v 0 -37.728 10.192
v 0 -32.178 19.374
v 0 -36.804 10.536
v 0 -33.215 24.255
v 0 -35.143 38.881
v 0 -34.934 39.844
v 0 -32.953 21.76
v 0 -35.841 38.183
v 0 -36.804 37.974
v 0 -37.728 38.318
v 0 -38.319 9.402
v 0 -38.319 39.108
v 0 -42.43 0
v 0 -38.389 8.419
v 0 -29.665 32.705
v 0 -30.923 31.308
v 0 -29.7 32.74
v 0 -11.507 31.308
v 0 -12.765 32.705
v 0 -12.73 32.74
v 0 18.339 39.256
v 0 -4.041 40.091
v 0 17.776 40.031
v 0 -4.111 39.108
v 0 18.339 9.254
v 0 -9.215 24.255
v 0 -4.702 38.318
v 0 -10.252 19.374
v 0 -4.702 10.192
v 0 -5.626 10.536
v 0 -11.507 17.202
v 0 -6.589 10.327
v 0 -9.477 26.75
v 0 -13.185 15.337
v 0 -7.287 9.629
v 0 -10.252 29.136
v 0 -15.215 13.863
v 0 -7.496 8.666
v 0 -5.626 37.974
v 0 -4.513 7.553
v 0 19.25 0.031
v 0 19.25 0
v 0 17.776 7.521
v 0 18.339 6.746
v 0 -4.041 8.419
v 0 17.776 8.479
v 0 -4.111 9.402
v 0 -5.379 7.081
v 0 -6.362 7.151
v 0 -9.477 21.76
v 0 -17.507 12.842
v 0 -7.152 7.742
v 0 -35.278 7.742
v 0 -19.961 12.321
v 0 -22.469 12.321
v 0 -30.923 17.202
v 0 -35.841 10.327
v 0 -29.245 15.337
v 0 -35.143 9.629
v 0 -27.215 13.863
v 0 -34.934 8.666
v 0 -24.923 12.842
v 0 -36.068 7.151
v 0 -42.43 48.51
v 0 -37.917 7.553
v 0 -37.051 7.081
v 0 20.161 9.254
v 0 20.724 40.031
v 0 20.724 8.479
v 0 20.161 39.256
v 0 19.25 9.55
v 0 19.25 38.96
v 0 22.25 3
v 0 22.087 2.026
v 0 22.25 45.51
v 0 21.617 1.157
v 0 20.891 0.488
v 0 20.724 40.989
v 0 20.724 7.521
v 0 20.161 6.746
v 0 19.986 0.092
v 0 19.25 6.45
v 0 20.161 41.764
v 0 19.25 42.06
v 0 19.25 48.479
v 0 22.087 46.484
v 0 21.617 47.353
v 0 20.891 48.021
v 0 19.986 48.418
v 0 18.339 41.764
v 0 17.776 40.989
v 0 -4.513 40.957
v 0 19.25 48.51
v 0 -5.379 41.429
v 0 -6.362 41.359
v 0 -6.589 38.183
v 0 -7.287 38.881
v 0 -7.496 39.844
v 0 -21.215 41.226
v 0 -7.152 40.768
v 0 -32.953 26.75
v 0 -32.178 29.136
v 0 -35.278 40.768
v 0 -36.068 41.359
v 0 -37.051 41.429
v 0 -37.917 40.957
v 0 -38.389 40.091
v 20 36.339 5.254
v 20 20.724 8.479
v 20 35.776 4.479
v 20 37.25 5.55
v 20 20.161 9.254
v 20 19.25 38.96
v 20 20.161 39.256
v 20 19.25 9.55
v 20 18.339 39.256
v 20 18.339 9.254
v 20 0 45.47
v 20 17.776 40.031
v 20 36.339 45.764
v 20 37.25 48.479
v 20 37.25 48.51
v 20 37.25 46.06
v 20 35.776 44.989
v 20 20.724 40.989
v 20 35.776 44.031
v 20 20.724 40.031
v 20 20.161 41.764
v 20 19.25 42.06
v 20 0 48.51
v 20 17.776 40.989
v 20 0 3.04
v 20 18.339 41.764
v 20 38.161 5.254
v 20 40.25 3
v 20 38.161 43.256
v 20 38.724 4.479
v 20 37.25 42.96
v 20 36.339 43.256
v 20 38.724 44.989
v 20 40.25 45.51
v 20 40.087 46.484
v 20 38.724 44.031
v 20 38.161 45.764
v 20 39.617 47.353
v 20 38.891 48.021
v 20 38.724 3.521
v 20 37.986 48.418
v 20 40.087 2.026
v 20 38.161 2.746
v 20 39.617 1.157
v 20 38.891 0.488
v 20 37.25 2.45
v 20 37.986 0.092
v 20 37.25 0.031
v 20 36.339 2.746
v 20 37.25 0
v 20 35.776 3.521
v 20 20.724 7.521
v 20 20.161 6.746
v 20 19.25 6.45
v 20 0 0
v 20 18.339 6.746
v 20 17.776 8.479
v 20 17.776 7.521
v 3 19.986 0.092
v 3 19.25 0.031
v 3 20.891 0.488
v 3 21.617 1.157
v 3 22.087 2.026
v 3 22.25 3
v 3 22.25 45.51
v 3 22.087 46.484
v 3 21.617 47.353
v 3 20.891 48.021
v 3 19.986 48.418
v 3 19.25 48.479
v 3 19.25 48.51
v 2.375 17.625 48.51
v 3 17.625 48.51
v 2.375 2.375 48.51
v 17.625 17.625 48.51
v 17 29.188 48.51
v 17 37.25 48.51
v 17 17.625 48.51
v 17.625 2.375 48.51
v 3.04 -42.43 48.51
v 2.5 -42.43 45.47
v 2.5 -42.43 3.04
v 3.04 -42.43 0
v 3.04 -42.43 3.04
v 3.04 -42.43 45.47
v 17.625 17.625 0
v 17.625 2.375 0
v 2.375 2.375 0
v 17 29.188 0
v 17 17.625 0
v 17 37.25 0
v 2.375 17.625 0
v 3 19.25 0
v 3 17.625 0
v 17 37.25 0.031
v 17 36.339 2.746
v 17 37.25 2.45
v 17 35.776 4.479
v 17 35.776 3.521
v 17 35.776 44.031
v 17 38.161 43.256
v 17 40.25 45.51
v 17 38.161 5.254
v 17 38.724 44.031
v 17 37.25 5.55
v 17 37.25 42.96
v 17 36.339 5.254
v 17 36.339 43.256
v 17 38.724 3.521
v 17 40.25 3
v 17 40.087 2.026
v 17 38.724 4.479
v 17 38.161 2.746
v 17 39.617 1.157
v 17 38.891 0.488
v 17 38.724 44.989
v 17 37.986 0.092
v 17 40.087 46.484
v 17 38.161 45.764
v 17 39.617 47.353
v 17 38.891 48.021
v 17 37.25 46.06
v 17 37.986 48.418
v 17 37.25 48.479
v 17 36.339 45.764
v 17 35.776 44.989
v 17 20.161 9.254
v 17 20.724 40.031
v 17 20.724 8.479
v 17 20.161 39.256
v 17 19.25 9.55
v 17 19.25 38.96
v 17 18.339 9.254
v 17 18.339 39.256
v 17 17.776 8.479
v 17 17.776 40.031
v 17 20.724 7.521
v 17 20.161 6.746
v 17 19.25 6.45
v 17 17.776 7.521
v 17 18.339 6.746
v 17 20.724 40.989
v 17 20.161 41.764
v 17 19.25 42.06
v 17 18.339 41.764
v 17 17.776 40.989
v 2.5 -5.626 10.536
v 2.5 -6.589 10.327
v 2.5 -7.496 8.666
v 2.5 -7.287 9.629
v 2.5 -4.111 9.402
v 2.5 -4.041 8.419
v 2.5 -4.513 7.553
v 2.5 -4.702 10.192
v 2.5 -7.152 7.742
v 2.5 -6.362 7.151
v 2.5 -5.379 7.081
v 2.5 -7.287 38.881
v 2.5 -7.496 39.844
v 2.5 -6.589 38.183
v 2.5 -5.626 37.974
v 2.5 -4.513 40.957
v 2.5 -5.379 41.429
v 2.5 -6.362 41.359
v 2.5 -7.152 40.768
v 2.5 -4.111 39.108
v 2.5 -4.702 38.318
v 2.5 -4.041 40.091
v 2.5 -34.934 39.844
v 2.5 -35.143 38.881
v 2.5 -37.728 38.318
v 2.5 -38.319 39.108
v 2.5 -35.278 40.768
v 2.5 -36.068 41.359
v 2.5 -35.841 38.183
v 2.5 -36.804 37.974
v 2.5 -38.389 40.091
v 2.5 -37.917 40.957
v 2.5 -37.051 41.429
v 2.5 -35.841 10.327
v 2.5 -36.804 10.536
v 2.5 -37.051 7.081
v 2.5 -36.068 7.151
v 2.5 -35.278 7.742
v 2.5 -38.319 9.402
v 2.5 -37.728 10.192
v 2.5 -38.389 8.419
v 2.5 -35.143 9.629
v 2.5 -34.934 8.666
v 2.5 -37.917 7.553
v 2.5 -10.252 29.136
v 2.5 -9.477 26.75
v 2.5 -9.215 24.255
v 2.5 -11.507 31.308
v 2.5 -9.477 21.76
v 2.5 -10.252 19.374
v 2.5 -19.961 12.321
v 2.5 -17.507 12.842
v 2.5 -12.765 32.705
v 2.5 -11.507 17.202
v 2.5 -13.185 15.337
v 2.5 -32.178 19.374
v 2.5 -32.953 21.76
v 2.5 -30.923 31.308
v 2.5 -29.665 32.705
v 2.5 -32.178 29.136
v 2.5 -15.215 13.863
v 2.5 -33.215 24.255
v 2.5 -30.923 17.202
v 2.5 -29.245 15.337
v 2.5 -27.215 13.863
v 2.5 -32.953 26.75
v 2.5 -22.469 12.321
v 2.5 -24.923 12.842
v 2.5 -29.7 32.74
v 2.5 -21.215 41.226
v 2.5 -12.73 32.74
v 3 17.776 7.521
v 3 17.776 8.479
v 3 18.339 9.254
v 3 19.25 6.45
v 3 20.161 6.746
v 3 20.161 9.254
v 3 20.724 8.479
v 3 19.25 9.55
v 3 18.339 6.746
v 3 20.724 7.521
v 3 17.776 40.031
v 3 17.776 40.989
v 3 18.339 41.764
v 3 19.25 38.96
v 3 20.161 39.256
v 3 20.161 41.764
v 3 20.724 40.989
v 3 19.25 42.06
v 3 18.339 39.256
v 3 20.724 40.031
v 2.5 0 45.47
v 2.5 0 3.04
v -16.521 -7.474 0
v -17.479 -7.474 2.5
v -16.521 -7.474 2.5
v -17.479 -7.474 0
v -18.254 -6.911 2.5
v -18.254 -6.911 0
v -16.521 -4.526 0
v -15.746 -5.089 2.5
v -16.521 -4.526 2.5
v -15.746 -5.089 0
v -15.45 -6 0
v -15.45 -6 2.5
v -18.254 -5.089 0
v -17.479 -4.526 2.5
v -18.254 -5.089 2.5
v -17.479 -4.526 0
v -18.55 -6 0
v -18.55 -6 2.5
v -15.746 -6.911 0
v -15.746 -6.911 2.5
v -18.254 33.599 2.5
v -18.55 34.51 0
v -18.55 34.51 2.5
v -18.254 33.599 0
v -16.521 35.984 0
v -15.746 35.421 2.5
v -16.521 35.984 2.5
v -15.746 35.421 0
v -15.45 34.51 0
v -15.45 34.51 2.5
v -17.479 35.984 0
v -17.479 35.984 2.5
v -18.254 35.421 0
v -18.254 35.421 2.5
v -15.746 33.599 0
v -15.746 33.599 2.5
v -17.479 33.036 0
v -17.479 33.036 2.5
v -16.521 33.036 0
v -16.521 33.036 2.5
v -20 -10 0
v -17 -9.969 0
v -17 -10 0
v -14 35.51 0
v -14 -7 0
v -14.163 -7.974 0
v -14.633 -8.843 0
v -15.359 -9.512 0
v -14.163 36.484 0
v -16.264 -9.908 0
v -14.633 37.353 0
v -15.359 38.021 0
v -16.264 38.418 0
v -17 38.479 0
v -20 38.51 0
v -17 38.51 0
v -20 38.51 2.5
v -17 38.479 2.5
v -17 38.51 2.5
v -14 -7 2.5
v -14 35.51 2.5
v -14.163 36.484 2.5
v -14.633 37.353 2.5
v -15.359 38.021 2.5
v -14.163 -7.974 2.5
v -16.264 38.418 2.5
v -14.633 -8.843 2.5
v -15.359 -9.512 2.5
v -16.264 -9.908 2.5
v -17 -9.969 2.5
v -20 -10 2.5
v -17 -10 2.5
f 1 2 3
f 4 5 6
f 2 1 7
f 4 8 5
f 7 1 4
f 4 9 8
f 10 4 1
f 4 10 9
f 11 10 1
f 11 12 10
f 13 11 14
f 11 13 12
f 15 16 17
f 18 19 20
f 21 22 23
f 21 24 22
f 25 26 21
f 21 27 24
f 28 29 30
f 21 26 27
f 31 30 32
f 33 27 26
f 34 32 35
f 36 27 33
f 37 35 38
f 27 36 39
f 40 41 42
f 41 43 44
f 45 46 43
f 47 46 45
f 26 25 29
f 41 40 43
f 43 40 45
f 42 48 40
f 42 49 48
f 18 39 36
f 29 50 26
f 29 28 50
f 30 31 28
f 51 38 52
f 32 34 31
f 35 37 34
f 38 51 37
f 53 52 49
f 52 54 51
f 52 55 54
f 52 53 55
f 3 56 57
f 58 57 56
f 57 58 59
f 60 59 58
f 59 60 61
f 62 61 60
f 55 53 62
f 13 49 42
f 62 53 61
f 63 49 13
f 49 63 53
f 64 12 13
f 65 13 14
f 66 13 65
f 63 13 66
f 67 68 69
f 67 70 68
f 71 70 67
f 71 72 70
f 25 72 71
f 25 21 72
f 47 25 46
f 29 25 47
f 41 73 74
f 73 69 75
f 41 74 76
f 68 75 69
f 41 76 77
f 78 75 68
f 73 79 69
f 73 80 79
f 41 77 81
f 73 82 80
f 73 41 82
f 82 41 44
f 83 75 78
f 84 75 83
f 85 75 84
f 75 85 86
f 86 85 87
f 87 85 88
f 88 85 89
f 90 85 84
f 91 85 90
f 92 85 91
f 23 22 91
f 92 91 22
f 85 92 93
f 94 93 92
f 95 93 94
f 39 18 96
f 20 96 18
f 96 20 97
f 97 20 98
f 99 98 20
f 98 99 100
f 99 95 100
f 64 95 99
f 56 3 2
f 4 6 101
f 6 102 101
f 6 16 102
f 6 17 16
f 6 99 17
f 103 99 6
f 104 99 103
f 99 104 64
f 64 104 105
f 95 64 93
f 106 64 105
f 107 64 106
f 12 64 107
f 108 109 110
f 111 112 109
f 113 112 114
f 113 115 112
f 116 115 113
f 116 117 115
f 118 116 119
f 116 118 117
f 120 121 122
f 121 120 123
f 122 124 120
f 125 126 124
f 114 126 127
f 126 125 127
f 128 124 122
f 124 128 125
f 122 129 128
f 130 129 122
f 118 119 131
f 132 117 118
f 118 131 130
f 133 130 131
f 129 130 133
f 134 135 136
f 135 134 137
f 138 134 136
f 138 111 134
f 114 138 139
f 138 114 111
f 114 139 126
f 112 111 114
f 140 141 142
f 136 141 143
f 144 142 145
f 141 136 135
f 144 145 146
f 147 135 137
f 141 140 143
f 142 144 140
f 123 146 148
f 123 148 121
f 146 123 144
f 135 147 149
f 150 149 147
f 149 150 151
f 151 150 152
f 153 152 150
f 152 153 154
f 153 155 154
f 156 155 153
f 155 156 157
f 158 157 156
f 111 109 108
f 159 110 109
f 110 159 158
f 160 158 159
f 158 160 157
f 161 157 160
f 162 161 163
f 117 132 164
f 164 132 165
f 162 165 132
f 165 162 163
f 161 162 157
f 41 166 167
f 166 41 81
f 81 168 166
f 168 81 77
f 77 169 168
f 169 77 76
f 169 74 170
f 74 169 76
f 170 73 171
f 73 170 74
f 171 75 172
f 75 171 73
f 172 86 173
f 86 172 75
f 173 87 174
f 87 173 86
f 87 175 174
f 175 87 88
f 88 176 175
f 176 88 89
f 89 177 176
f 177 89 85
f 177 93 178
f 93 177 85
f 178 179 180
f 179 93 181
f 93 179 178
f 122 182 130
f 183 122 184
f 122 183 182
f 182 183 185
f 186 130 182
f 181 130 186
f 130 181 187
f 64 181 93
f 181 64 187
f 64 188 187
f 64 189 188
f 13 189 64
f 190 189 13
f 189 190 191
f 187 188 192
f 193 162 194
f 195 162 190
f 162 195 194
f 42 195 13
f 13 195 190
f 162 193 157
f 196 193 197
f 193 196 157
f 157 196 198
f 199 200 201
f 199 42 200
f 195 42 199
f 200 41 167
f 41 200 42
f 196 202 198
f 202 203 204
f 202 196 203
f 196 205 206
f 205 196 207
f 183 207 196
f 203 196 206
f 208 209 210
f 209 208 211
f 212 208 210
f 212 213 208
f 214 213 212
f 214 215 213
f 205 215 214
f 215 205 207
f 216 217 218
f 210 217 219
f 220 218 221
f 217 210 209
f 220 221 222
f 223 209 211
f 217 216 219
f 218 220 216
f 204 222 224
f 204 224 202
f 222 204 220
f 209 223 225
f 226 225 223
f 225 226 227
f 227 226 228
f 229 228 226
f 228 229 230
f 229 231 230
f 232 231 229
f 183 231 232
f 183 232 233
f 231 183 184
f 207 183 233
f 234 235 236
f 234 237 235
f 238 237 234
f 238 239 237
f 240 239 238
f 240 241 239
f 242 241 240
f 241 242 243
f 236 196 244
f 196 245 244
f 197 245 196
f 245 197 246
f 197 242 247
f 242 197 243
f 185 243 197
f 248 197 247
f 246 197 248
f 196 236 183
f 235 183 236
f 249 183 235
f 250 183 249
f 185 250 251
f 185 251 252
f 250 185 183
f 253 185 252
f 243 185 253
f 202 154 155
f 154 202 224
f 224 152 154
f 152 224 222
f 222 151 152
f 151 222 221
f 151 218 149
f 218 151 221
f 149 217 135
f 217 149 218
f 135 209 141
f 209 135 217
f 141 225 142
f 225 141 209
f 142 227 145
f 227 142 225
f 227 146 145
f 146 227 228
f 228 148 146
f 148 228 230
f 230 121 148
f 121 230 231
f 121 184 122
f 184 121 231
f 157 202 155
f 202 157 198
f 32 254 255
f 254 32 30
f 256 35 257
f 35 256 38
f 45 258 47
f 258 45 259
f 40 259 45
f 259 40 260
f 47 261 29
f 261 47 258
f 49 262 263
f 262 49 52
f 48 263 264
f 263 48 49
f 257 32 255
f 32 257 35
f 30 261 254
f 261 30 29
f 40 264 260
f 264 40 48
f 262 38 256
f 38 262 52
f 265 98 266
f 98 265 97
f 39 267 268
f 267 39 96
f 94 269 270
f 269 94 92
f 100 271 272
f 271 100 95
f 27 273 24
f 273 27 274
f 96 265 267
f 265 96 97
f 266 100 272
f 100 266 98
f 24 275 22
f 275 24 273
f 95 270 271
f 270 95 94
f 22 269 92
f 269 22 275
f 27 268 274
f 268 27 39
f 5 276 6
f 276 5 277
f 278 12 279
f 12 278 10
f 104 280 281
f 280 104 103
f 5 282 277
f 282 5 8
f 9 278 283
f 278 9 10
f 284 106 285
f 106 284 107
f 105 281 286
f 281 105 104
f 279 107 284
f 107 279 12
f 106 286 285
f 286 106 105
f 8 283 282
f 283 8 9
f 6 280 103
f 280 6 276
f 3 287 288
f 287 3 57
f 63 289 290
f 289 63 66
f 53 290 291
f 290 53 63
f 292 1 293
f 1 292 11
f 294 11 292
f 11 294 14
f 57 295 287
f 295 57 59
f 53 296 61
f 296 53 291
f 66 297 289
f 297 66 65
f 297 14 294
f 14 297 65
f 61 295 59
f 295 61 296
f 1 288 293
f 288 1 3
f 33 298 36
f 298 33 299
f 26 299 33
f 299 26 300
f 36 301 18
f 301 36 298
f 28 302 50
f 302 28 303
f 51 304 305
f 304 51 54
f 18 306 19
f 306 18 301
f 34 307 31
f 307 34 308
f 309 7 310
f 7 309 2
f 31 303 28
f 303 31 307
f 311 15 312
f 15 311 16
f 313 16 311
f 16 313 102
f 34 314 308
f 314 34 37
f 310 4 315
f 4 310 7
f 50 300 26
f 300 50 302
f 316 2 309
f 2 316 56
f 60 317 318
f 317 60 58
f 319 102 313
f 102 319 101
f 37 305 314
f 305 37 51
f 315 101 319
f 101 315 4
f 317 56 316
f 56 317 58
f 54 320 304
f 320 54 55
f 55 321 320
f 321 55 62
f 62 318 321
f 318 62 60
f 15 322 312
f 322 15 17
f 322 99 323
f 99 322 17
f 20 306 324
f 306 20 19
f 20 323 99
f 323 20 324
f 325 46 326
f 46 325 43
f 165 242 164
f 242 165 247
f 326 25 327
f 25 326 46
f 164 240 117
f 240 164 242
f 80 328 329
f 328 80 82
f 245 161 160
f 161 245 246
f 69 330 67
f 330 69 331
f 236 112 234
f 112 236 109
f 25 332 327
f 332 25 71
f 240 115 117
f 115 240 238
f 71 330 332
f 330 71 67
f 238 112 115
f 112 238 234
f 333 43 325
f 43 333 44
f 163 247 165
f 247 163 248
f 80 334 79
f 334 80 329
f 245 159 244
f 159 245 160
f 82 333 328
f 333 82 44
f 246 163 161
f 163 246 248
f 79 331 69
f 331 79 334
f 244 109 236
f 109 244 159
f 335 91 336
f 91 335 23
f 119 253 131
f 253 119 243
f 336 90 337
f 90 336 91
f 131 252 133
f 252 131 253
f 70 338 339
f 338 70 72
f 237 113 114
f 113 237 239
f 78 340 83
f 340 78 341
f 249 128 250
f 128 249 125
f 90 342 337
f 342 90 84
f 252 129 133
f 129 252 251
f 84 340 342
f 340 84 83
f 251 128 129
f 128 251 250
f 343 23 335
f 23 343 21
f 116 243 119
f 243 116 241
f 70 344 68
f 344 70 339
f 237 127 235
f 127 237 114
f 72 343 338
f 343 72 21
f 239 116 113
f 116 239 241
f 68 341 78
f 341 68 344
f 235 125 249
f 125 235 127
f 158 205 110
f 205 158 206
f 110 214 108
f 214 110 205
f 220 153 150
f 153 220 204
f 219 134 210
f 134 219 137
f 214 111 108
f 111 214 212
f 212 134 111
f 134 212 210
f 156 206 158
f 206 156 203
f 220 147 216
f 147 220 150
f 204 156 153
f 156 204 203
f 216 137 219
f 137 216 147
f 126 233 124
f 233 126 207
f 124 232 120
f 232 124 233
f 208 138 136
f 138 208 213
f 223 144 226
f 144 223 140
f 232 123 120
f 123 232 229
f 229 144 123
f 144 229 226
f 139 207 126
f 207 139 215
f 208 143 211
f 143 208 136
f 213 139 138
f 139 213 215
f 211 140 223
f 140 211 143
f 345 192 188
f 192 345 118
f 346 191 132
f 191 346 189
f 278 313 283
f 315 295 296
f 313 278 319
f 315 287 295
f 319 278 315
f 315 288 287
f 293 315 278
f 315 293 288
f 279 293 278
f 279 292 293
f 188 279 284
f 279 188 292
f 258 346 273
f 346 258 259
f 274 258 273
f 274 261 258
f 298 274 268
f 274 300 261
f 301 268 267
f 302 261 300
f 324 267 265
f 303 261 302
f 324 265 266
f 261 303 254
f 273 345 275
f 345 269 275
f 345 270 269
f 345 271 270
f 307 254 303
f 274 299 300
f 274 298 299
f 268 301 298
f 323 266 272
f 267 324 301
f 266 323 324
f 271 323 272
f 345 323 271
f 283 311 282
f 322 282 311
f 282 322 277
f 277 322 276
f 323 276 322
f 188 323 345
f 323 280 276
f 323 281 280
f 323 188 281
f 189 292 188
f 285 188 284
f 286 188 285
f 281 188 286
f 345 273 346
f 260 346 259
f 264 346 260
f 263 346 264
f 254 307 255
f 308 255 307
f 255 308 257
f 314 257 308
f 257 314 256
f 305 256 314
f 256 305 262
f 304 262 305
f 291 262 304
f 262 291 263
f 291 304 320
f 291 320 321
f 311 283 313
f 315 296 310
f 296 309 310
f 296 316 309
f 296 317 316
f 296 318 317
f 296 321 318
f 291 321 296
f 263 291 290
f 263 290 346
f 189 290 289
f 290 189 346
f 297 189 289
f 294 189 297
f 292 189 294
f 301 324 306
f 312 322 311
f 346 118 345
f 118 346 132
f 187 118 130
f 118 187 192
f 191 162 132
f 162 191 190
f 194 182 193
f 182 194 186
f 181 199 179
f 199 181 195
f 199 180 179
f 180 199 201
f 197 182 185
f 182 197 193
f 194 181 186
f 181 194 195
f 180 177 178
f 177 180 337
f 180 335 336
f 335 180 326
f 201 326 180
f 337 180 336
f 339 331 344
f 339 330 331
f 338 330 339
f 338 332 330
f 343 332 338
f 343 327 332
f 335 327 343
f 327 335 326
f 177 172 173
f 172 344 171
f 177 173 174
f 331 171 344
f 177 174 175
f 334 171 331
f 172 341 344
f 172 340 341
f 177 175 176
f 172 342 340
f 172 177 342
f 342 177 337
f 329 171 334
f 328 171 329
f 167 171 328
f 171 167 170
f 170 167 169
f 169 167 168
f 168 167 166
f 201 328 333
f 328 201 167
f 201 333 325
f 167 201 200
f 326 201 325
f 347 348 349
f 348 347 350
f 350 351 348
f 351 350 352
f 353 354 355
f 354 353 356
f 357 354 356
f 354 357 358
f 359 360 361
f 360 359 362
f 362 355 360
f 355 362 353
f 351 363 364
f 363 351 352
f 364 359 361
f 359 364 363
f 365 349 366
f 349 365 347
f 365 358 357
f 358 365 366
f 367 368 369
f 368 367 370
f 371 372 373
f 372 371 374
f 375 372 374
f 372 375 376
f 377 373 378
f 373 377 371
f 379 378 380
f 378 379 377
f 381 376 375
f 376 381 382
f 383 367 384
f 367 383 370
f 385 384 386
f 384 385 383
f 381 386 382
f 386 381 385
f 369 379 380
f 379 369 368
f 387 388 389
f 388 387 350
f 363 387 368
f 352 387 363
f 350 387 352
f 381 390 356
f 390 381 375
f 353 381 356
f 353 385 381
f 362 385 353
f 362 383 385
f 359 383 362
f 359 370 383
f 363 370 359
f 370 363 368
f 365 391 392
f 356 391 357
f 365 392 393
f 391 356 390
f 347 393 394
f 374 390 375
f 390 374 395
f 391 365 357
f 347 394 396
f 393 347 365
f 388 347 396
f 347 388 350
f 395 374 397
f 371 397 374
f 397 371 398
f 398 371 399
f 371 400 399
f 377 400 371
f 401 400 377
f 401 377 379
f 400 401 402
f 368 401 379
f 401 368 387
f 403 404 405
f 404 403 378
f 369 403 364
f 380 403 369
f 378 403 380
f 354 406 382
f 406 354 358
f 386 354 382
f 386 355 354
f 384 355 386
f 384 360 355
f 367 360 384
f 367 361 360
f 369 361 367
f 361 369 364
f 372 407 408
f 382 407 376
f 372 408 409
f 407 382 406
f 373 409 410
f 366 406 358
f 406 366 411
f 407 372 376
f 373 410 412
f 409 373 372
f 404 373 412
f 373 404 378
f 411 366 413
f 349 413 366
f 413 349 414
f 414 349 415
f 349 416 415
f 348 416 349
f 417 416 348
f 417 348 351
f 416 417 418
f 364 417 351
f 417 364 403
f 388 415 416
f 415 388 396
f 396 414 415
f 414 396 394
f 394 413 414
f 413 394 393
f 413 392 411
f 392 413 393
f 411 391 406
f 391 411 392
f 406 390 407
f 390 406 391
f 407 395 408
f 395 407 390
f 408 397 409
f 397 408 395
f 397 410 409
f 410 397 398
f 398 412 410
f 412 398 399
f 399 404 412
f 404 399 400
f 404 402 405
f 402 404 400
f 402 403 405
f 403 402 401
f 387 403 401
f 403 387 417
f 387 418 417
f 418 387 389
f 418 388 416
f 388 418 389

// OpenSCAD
// file: sweep.scad
// sweep.scad
//
// This code is copied from
// https://github.com/openscad/list-comprehension-demos
// and
// https://github.com/openscad/scad-utils
// to make hangprinter repo self-contained
// It was included in order to make the worm drive parametric
// In future OpenSCAD (or other script CAD programs)
// worm drives should be will be more easily constructed without
// this user space defined sweep operation.
// See OpenSCAD discussion at:
// https://github.com/openscad/openscad/issues/114

// Look into files
// lists.scad
// X transformations.scad
// linalg.scad
// se3.scad
// so3.scad


// Include modules and fcts:

/// linalg.scad
function vec3(p) = len(p) < 3 ? concat(p,0) : p;
function vec4(p) = let (v3=vec3(p)) len(v3) < 4 ? concat(v3,1) : v3;
function take3(v) = [v[0],v[1],v[2]];
function tail3(v) = [v[3],v[4],v[5]];
function construct_Rt(R,t) = [concat(R[0],t[0]),concat(R[1],t[1]),concat(R[2],t[2]),[0,0,0,1]];


/// so3.scad

function so3_exp_2(theta_sq) = [
	1.0 - theta_sq * (1.0 - theta_sq/20) / 6,
	0.5 - 0.25/6 * theta_sq
];


// Taylor series expansions close to 0
function so3_exp_1(theta_sq) = [
	1 - 1/6*theta_sq,
	0.5
];

function rodrigues_so3_exp(w, A, B) = [
  [1.0 - B*(w[1]*w[1] + w[2]*w[2]), B*(w[0]*w[1]) - A*w[2],          B*(w[0]*w[2]) + A*w[1]],
  [B*(w[0]*w[1]) + A*w[2],          1.0 - B*(w[0]*w[0] + w[2]*w[2]), B*(w[1]*w[2]) - A*w[0]],
  [B*(w[0]*w[2]) - A*w[1],          B*(w[1]*w[2]) + A*w[0],          1.0 - B*(w[0]*w[0] + w[1]*w[1])]
];

function so3_exp_3_0(theta_deg, inv_theta) = [
	sin(theta_deg) * inv_theta,
	(1 - cos(theta_deg)) * (inv_theta * inv_theta)
];

/// se3.scad
function se3_exp_2(t,w) = se3_exp_2_0(t,w,w*w);
function se3_exp_2_0(t,w,theta_sq) =
se3_exp_23(
	so3_exp_2(theta_sq),
	C = (1.0 - theta_sq/20) / 6,
	t=t,w=w);

function combine_se3_exp(w, ABt) = construct_Rt(rodrigues_so3_exp(w, ABt[0], ABt[1]), ABt[2]);
function se3_exp_1(t,w) = concat(
	so3_exp_1(w*w),
	[t + 0.5 * cross(w,t)]
);

function se3_exp_3(t,w) = se3_exp_3_0(t,w,sqrt(w*w)*180/PI,1/sqrt(w*w));

function se3_exp_23(AB,C,t,w) =
[AB[0], AB[1], t + AB[1] * cross(w,t) + C * cross(w,cross(w,t)) ];

function se3_exp_3_0(t,w,theta_deg,inv_theta) =
se3_exp_23(
	so3_exp_3_0(theta_deg = theta_deg, inv_theta = inv_theta),
	C = (1 - sin(theta_deg) * inv_theta) * (inv_theta * inv_theta),
t=t,w=w);

function se3_exp(mu) = se3_exp_0(t=take3(mu),w=tail3(mu)/180*PI);

function se3_exp_0(t,w) =
combine_se3_exp(w,
// Evaluate by Taylor expansion when near 0
	w*w < 1e-8
	? se3_exp_1(t,w)
	: w*w < 1e-6
	  ? se3_exp_2(t,w)
	  : se3_exp_3(t,w)
);


/// lists.scad
/*!
  Flattens a list one level:

  flatten([[0,1],[2,3]]) => [0,1,2,3]
*/
function flatten(list) = [ for (i = list, v = i) v ];
/*!
  Extracts a subarray from index begin (inclusive) to end (exclusive)

  subarray([1,2,3,4], 1, 2) => [2,3]
*/
function subarray(list,begin=0,end=-1) = [
    let(end = end < 0 ? len(list) : end)
      for (i = [begin : 1 : end-1])
        list[i]
];

/// transformations.scad
//********* Create modifying matrices ***************//
/*!
  Creates a rotation matrix

  xyz = euler angles = rz * ry * rx
  axis = rotation_axis * rotation_angle
*/
function rotation(xyz=undef, axis=undef) =
	xyz != undef && axis != undef ? undef :
	xyz == undef  ? se3_exp([0,0,0,axis[0],axis[1],axis[2]]) :
	len(xyz) == undef ? rotation(axis=[0,0,xyz]) :
	(len(xyz) >= 3 ? rotation(axis=[0,0,xyz[2]]) : identity4()) *
	(len(xyz) >= 2 ? rotation(axis=[0,xyz[1],0]) : identity4()) *
(len(xyz) >= 1 ? rotation(axis=[xyz[0],0,0]) : identity4());

/*!
  Creates a scaling matrix
*/
function scaling(v) = [
	[v[0],0,0,0],
	[0,v[1],0,0],
	[0,0,v[2],0],
	[0,0,0,1],
];

/*!
  Creates a translation matrix
*/
function translation(v) = [
	[1,0,0,v[0]],
	[0,1,0,v[1]],
	[0,0,1,v[2]],
	[0,0,0,1],
];


function project(x) = subarray(x,end=len(x)-1) / x[len(x)-1];

function transform(m, list) = [for (p=list) project(m * vec4(p))];

function to_3d(list) = [ for(v = list) vec3(v) ];

module sweep(shape, path_transforms, closed=false) {

    pathlen = len(path_transforms);
    segments = pathlen + (closed ? 0 : -1);
    shape3d = to_3d(shape);

    function sweep_points() =
      flatten([for (i=[0:pathlen-1])
        transform(path_transforms[i], shape3d)]);

    function loop_faces() = [let (facets=len(shape3d))
        for(s=[0:segments-1], i=[0:facets-1])
          [(s%pathlen) * facets + i,
           (s%pathlen) * facets + (i + 1) % facets,
           ((s + 1) % pathlen) * facets + (i + 1) % facets,
           ((s + 1) % pathlen) * facets + i]];

    bottom_cap = closed ? [] : [[for (i=[len(shape3d)-1:-1:0]) i]];
    top_cap = closed ? [] : [
      [for (i=[0:len(shape3d)-1])
        i+len(shape3d)*(pathlen-1)]];
    polyhedron(points = sweep_points(),
               faces  = concat(loop_faces(),
                               bottom_cap,
                               top_cap),
               convexity=5);
}
// file: parameters.scad
// Parameters shared between modules

Beam_width = 15;
Wiggle = 0.25;
Fat_beam_width = Beam_width + Wiggle;
Beam_length = 400;
Wall_th = 2.5;
Nema17_cube_width          = 42.43;
Nema17_screw_hole_width    = 43.74; // Opposite corner screws
Nema17_ring_diameter       = 22;
Nema17_cube_height         = 39.36;
Nema17_shaft_height        = 63.65;
Nema17_ring_height         = 2;
Nema17_screw_hole_width    = 43.74; // Opposite corner screws
Nema17_shaft_radius        = 5/2;
Nema23_cube_width          = 56;
Nema23_screw_hole_width    = 66.61;
Nema23_screw_holes          = 66.61;
Nema23_ring_diameter       = 38;
Nema23_cube_height         = 56;
Nema23_shaft_height        = 21;
Nema23_ring_height         = 2;
Nema23_shaft_radius        = 6.35/2;

b608_outer_dia = 22.2;
b608_width = 7.05;

Gap_between_sandwich_and_plate = 1.7;

Clamp_wall_extra_length = 4.5;
Clamp_wall_flex_factor = 1.5;
// main file
include <parameters.scad>
use <sweep.scad>
use <util.scad>

cw = Nema17_cube_width; // For brevity...
wiggle = 0.54;
r_little = 3;
block_height = Beam_width+2*Wall_th;
block_depth = cw + 2*wiggle + 2*Wall_th;
cable_clamp_o = 4;
cable_clamp_ex_l = 20;

extruder_holder();
module extruder_holder(){

  edges = 0.625;
  opening_width = Fat_beam_width - 2*edges;
  //main_block();
  module main_block(){
    translate([0,-cw,0])
      rotate([90,0,90])
      linear_extrude(height=block_height, slices=1)
      rounded_2corner([cw + Wall_th + Fat_beam_width + 2 + Wall_th,
          block_depth],
          r_little);
    translate([(Fat_beam_width+Beam_width)/2+Wall_th-edges,0,0])
    rotate([90,0,90])
      linear_extrude(height=Wall_th+edges-(Fat_beam_width-Beam_width)/2, slices=1)
      rounded_2corner([2*Wall_th + Fat_beam_width + cable_clamp_ex_l,
          block_depth],
          r_little);
  }
  ex_l = cw*2/sqrt(3);


  difference(){
    main_block();
    translate([Wall_th,-cw-1,Wall_th+wiggle])
      cube([cw,cw+1,cw]);
    translate([Beam_width+2*Wall_th,0,0])
      rotate([0,0,-atan((Beam_width+Wall_th-wiggle)/(cw))])
      translate([0,-ex_l,-1])
      cube([cw,ex_l,cw+2*(wiggle+Wall_th+1)]);
    translate([0,0,Wall_th+wiggle])
      rotate([0,90,0])
      translate([-cw/2, -cw/2, -1]){
        Nema17_screw_holes(3.5, Wall_th+2, $fs=1);
        rotate([0,0,90])
          teardrop(r=(Nema17_ring_diameter+2)/2, h=Wall_th+2);
      }
    translate([Wall_th-Wiggle/2, Wall_th-Wiggle/2, -1])
      fat_beam(block_depth+2, standing=true);
    translate([(Wall_th-Wiggle/2)+opening_width/2+edges, Fat_beam_width+Wall_th, -1])
      cube([opening_width, Fat_beam_width*1.5, 2*block_depth+3], center=true);
    // Holes for clamping screws
    for(i=[8,block_depth-8])
      translate([0,Fat_beam_width+2*Wall_th+2-3,i])
        rotate([0,90,0]){
          translate([0,0,-1])
            cylinder(d=3.1, h=block_height+2, $fs=1);
        }
    // For cable holder screws
    for(i=[cable_clamp_o,block_depth-cable_clamp_o])
      translate([0,Fat_beam_width+2*Wall_th+cable_clamp_ex_l-3,i])
        rotate([0,90,0])
        cylinder(d=3.1, h=4*Beam_width, $fn=10, center=true);
  }
}

// Use this part to screw tight
translate([-20,-10,0])
Flat_cable_clamper();
module Flat_cable_clamper(){
  difference(){
    linear_extrude(height=Wall_th, slices=1)
      rounded_2corner([6,
          block_depth],
          r_little);
    for(i=[cable_clamp_o,block_depth-cable_clamp_o])
      translate([3,i,0])
        cylinder(d=3.1, h=block_height+2, $fn=10, center=true);
  }
}

module Placed_cable_clamper(){
  translate([-6,wiggle + 2*Wall_th + Fat_beam_width + cable_clamp_ex_l,0])
    rotate([90,0,90])
    Flat_cable_clamper();
}
